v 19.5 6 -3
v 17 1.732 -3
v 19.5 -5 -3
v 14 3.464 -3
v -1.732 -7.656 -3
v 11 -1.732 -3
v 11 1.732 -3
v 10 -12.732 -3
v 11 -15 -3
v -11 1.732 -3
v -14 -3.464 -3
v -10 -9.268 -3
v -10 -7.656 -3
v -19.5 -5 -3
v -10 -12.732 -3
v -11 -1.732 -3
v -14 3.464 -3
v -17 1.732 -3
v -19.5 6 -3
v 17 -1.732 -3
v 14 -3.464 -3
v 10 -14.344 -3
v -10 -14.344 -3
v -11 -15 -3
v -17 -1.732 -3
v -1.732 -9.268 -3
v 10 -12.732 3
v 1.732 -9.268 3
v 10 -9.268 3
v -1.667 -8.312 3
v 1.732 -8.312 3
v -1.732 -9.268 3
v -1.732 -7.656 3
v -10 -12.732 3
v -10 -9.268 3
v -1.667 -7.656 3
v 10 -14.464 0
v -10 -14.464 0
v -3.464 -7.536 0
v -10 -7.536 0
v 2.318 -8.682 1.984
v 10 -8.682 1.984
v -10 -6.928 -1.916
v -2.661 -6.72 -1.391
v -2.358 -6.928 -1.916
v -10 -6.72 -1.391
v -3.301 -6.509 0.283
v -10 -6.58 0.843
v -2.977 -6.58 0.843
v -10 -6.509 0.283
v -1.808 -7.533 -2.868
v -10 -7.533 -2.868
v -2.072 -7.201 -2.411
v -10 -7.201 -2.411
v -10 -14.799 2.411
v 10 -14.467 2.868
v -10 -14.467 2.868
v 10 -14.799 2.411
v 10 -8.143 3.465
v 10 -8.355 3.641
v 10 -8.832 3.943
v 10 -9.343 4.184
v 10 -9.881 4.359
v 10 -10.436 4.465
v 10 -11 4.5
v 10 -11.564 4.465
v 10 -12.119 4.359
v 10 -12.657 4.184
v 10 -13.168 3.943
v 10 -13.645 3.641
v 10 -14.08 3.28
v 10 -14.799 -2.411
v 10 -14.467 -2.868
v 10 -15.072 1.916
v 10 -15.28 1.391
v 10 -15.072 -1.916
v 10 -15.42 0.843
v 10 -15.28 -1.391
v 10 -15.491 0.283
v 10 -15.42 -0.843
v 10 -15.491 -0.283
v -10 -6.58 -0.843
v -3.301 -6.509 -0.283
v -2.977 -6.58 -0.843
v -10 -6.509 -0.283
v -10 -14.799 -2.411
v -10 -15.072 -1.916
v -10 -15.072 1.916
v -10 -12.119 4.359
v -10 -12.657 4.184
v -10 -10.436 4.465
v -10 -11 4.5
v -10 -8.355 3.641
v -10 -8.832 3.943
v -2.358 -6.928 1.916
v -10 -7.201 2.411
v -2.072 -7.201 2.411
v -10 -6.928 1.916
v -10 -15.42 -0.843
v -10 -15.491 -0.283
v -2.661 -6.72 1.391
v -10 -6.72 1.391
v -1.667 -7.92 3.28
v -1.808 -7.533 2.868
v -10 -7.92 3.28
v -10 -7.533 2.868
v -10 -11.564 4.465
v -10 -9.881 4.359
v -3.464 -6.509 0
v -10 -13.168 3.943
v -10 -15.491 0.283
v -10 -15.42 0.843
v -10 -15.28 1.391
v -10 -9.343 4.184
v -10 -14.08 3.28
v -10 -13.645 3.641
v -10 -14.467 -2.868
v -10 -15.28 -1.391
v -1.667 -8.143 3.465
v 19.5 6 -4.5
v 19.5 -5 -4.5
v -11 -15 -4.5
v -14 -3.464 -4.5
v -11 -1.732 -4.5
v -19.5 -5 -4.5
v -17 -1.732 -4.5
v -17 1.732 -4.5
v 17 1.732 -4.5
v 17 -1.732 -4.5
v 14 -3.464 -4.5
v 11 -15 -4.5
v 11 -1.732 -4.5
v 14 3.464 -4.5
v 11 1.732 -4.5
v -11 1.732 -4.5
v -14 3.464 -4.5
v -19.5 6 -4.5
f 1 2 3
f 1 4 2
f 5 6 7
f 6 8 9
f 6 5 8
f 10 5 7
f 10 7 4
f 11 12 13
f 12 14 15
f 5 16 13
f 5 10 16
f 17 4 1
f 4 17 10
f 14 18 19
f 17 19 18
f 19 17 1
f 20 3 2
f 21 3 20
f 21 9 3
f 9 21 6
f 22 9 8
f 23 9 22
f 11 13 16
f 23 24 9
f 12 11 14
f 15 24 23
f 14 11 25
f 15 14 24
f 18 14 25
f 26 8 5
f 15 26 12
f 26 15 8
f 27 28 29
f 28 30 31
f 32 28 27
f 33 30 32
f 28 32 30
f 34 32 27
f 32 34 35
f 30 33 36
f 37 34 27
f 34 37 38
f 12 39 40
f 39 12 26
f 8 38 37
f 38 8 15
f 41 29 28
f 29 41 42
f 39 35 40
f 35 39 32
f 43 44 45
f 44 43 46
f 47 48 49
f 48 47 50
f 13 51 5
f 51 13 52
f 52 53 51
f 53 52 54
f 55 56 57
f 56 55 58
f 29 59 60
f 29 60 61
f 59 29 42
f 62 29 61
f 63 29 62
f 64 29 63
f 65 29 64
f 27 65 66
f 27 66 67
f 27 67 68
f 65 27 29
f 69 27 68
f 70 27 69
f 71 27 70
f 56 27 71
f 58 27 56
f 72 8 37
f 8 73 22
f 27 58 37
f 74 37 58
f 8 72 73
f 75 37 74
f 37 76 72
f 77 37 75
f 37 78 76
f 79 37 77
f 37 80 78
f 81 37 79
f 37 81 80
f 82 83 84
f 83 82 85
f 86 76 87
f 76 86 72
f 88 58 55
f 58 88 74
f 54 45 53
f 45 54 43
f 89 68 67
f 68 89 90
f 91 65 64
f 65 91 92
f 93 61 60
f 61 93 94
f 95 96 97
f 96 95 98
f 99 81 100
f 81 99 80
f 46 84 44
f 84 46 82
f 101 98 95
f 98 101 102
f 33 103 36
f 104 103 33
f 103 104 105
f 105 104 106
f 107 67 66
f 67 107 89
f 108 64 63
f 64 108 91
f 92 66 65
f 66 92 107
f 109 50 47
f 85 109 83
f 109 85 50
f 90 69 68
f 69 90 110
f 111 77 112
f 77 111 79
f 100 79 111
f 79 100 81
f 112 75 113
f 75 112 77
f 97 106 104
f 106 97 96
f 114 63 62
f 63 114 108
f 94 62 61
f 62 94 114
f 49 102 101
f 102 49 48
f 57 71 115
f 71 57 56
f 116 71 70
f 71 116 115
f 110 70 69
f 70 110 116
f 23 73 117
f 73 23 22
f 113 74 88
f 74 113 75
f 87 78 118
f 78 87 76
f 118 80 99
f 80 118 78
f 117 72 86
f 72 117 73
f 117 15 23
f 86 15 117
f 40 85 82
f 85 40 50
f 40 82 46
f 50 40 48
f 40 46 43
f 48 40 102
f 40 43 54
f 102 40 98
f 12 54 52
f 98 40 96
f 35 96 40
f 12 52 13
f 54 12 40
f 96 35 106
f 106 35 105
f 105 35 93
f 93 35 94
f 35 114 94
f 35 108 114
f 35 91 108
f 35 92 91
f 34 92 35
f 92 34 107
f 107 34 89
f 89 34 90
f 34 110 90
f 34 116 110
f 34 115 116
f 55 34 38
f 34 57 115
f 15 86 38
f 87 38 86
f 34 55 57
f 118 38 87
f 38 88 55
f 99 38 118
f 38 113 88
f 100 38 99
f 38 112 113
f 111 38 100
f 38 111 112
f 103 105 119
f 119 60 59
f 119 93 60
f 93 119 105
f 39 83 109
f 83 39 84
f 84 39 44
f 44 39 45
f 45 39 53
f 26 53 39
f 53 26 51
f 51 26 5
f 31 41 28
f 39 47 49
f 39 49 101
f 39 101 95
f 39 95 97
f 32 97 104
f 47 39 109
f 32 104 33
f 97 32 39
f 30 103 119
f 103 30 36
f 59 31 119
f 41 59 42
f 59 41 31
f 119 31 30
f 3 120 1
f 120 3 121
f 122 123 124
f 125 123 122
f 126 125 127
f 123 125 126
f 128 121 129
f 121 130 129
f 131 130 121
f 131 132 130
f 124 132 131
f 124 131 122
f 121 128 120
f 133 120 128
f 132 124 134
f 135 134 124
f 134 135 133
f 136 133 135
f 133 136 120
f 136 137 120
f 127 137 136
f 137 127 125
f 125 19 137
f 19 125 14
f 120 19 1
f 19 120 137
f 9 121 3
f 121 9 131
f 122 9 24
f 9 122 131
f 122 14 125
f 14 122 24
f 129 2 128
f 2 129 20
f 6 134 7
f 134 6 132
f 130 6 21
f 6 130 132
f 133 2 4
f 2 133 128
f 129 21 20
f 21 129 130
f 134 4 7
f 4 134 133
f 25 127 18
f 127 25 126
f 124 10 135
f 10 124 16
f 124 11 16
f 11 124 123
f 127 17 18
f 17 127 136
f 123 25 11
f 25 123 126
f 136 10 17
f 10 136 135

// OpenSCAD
// file: trapeze.scad
module trapeze(base, top, height, lentgth) {
    linear_extrude(height = height, center=true)
        hull() {
            square([base,0.0001], center=true);
            mv(0,lentgth,0)
                square([top,0.0001], center=true);
        }
}
// file: hexagone.scad
function cot(x)=1/tan(x);

module Hexagone(cle,h)
{
	angle = 360/6;		// 6 pans
	cote = cle * cot(angle);
	echo(angle, cot(angle), cote);
	echo(acos(.6));

	union()
	{
		rotate([0,0,0])
			cube([cle,cote,h],center=true);
		rotate([0,0,angle])
			cube([cle,cote,h],center=true);
		rotate([0,0,2*angle])
			cube([cle,cote,h],center=true);
	}
}
// file: utils.scad
module mv(x, y, z) {
    translate([x,y,z]) {
        children([0 : $children]);
   }
}

module rot(x, y, z) {
    rotate([x,y,z]) {
        children([0 : $children]);
   }
}

module trans() {
    %children();
}

module hash() {
    #children();
}

module fidt() {
    children(0);
    difference() {
        trans()
        children(1);
        hash()
        children(0);
   }
}

module fid() {
    difference() {
        children(1);
        children(0);
   }
}

module dif() {
    difference() {
        children(0);
        children(1);
   }
}

module dift() {
    children(1);
    difference() {
        trans()
        children(0);
        hash()
        children(1);
   }
}

module mirx() {
    children(0);
    mirror([1,0,0]) {
        children(0);
   }
}

module miry() {
    children(0);
    mirror([0,1,0]) {
        children(0);
   }
}

module mirz() {
    children(0);
    mirror([0,0,1]) {
        children(0);
   }
}
// main file
include<utils.scad>
include<hexagone.scad>
include<trapeze.scad>

hexa_spacing=28;
hexa_height=30;
hexa_key=6;

antena_key=6;
antena_heigh=20;
antena_protlen=3;

fid() {
    mirx() {
        mv(hexa_spacing/2,0,0) {
            Hexagone(hexa_key, hexa_height);
        }
    }
    union(){
        mv(0,-11,0) {
            dif() {
                rot(0,90,0) {
                    fid() {
                        Hexagone(antena_key, antena_heigh+1);
                        cylinder(h=antena_heigh, d=antena_key+antena_protlen, $fn=50, center = true);
                    }
                }
                union() {
                    rot(-20,0,0)
                        mv(antena_heigh/2.4,(antena_key+antena_protlen)/2,0)
                        cube([antena_heigh,antena_key,antena_key*2], center=true);
                    mv(0,3,0)
                        rot(0,90,90)
                        Hexagone(6,5);
                }
            }

        }
        union() {
            mv(0,0.5,-antena_key/2-antena_protlen/4)
                cube([hexa_spacing+11,11,antena_protlen/2], center=true);

            mv(0,-15,-antena_key/2-antena_protlen/4)
                trapeze(antena_heigh+2, hexa_spacing+11, antena_protlen/2, 10);
        }
    }
}

/*rot(0,90,0)*/
/*#Hexagone(2, 28);*/
